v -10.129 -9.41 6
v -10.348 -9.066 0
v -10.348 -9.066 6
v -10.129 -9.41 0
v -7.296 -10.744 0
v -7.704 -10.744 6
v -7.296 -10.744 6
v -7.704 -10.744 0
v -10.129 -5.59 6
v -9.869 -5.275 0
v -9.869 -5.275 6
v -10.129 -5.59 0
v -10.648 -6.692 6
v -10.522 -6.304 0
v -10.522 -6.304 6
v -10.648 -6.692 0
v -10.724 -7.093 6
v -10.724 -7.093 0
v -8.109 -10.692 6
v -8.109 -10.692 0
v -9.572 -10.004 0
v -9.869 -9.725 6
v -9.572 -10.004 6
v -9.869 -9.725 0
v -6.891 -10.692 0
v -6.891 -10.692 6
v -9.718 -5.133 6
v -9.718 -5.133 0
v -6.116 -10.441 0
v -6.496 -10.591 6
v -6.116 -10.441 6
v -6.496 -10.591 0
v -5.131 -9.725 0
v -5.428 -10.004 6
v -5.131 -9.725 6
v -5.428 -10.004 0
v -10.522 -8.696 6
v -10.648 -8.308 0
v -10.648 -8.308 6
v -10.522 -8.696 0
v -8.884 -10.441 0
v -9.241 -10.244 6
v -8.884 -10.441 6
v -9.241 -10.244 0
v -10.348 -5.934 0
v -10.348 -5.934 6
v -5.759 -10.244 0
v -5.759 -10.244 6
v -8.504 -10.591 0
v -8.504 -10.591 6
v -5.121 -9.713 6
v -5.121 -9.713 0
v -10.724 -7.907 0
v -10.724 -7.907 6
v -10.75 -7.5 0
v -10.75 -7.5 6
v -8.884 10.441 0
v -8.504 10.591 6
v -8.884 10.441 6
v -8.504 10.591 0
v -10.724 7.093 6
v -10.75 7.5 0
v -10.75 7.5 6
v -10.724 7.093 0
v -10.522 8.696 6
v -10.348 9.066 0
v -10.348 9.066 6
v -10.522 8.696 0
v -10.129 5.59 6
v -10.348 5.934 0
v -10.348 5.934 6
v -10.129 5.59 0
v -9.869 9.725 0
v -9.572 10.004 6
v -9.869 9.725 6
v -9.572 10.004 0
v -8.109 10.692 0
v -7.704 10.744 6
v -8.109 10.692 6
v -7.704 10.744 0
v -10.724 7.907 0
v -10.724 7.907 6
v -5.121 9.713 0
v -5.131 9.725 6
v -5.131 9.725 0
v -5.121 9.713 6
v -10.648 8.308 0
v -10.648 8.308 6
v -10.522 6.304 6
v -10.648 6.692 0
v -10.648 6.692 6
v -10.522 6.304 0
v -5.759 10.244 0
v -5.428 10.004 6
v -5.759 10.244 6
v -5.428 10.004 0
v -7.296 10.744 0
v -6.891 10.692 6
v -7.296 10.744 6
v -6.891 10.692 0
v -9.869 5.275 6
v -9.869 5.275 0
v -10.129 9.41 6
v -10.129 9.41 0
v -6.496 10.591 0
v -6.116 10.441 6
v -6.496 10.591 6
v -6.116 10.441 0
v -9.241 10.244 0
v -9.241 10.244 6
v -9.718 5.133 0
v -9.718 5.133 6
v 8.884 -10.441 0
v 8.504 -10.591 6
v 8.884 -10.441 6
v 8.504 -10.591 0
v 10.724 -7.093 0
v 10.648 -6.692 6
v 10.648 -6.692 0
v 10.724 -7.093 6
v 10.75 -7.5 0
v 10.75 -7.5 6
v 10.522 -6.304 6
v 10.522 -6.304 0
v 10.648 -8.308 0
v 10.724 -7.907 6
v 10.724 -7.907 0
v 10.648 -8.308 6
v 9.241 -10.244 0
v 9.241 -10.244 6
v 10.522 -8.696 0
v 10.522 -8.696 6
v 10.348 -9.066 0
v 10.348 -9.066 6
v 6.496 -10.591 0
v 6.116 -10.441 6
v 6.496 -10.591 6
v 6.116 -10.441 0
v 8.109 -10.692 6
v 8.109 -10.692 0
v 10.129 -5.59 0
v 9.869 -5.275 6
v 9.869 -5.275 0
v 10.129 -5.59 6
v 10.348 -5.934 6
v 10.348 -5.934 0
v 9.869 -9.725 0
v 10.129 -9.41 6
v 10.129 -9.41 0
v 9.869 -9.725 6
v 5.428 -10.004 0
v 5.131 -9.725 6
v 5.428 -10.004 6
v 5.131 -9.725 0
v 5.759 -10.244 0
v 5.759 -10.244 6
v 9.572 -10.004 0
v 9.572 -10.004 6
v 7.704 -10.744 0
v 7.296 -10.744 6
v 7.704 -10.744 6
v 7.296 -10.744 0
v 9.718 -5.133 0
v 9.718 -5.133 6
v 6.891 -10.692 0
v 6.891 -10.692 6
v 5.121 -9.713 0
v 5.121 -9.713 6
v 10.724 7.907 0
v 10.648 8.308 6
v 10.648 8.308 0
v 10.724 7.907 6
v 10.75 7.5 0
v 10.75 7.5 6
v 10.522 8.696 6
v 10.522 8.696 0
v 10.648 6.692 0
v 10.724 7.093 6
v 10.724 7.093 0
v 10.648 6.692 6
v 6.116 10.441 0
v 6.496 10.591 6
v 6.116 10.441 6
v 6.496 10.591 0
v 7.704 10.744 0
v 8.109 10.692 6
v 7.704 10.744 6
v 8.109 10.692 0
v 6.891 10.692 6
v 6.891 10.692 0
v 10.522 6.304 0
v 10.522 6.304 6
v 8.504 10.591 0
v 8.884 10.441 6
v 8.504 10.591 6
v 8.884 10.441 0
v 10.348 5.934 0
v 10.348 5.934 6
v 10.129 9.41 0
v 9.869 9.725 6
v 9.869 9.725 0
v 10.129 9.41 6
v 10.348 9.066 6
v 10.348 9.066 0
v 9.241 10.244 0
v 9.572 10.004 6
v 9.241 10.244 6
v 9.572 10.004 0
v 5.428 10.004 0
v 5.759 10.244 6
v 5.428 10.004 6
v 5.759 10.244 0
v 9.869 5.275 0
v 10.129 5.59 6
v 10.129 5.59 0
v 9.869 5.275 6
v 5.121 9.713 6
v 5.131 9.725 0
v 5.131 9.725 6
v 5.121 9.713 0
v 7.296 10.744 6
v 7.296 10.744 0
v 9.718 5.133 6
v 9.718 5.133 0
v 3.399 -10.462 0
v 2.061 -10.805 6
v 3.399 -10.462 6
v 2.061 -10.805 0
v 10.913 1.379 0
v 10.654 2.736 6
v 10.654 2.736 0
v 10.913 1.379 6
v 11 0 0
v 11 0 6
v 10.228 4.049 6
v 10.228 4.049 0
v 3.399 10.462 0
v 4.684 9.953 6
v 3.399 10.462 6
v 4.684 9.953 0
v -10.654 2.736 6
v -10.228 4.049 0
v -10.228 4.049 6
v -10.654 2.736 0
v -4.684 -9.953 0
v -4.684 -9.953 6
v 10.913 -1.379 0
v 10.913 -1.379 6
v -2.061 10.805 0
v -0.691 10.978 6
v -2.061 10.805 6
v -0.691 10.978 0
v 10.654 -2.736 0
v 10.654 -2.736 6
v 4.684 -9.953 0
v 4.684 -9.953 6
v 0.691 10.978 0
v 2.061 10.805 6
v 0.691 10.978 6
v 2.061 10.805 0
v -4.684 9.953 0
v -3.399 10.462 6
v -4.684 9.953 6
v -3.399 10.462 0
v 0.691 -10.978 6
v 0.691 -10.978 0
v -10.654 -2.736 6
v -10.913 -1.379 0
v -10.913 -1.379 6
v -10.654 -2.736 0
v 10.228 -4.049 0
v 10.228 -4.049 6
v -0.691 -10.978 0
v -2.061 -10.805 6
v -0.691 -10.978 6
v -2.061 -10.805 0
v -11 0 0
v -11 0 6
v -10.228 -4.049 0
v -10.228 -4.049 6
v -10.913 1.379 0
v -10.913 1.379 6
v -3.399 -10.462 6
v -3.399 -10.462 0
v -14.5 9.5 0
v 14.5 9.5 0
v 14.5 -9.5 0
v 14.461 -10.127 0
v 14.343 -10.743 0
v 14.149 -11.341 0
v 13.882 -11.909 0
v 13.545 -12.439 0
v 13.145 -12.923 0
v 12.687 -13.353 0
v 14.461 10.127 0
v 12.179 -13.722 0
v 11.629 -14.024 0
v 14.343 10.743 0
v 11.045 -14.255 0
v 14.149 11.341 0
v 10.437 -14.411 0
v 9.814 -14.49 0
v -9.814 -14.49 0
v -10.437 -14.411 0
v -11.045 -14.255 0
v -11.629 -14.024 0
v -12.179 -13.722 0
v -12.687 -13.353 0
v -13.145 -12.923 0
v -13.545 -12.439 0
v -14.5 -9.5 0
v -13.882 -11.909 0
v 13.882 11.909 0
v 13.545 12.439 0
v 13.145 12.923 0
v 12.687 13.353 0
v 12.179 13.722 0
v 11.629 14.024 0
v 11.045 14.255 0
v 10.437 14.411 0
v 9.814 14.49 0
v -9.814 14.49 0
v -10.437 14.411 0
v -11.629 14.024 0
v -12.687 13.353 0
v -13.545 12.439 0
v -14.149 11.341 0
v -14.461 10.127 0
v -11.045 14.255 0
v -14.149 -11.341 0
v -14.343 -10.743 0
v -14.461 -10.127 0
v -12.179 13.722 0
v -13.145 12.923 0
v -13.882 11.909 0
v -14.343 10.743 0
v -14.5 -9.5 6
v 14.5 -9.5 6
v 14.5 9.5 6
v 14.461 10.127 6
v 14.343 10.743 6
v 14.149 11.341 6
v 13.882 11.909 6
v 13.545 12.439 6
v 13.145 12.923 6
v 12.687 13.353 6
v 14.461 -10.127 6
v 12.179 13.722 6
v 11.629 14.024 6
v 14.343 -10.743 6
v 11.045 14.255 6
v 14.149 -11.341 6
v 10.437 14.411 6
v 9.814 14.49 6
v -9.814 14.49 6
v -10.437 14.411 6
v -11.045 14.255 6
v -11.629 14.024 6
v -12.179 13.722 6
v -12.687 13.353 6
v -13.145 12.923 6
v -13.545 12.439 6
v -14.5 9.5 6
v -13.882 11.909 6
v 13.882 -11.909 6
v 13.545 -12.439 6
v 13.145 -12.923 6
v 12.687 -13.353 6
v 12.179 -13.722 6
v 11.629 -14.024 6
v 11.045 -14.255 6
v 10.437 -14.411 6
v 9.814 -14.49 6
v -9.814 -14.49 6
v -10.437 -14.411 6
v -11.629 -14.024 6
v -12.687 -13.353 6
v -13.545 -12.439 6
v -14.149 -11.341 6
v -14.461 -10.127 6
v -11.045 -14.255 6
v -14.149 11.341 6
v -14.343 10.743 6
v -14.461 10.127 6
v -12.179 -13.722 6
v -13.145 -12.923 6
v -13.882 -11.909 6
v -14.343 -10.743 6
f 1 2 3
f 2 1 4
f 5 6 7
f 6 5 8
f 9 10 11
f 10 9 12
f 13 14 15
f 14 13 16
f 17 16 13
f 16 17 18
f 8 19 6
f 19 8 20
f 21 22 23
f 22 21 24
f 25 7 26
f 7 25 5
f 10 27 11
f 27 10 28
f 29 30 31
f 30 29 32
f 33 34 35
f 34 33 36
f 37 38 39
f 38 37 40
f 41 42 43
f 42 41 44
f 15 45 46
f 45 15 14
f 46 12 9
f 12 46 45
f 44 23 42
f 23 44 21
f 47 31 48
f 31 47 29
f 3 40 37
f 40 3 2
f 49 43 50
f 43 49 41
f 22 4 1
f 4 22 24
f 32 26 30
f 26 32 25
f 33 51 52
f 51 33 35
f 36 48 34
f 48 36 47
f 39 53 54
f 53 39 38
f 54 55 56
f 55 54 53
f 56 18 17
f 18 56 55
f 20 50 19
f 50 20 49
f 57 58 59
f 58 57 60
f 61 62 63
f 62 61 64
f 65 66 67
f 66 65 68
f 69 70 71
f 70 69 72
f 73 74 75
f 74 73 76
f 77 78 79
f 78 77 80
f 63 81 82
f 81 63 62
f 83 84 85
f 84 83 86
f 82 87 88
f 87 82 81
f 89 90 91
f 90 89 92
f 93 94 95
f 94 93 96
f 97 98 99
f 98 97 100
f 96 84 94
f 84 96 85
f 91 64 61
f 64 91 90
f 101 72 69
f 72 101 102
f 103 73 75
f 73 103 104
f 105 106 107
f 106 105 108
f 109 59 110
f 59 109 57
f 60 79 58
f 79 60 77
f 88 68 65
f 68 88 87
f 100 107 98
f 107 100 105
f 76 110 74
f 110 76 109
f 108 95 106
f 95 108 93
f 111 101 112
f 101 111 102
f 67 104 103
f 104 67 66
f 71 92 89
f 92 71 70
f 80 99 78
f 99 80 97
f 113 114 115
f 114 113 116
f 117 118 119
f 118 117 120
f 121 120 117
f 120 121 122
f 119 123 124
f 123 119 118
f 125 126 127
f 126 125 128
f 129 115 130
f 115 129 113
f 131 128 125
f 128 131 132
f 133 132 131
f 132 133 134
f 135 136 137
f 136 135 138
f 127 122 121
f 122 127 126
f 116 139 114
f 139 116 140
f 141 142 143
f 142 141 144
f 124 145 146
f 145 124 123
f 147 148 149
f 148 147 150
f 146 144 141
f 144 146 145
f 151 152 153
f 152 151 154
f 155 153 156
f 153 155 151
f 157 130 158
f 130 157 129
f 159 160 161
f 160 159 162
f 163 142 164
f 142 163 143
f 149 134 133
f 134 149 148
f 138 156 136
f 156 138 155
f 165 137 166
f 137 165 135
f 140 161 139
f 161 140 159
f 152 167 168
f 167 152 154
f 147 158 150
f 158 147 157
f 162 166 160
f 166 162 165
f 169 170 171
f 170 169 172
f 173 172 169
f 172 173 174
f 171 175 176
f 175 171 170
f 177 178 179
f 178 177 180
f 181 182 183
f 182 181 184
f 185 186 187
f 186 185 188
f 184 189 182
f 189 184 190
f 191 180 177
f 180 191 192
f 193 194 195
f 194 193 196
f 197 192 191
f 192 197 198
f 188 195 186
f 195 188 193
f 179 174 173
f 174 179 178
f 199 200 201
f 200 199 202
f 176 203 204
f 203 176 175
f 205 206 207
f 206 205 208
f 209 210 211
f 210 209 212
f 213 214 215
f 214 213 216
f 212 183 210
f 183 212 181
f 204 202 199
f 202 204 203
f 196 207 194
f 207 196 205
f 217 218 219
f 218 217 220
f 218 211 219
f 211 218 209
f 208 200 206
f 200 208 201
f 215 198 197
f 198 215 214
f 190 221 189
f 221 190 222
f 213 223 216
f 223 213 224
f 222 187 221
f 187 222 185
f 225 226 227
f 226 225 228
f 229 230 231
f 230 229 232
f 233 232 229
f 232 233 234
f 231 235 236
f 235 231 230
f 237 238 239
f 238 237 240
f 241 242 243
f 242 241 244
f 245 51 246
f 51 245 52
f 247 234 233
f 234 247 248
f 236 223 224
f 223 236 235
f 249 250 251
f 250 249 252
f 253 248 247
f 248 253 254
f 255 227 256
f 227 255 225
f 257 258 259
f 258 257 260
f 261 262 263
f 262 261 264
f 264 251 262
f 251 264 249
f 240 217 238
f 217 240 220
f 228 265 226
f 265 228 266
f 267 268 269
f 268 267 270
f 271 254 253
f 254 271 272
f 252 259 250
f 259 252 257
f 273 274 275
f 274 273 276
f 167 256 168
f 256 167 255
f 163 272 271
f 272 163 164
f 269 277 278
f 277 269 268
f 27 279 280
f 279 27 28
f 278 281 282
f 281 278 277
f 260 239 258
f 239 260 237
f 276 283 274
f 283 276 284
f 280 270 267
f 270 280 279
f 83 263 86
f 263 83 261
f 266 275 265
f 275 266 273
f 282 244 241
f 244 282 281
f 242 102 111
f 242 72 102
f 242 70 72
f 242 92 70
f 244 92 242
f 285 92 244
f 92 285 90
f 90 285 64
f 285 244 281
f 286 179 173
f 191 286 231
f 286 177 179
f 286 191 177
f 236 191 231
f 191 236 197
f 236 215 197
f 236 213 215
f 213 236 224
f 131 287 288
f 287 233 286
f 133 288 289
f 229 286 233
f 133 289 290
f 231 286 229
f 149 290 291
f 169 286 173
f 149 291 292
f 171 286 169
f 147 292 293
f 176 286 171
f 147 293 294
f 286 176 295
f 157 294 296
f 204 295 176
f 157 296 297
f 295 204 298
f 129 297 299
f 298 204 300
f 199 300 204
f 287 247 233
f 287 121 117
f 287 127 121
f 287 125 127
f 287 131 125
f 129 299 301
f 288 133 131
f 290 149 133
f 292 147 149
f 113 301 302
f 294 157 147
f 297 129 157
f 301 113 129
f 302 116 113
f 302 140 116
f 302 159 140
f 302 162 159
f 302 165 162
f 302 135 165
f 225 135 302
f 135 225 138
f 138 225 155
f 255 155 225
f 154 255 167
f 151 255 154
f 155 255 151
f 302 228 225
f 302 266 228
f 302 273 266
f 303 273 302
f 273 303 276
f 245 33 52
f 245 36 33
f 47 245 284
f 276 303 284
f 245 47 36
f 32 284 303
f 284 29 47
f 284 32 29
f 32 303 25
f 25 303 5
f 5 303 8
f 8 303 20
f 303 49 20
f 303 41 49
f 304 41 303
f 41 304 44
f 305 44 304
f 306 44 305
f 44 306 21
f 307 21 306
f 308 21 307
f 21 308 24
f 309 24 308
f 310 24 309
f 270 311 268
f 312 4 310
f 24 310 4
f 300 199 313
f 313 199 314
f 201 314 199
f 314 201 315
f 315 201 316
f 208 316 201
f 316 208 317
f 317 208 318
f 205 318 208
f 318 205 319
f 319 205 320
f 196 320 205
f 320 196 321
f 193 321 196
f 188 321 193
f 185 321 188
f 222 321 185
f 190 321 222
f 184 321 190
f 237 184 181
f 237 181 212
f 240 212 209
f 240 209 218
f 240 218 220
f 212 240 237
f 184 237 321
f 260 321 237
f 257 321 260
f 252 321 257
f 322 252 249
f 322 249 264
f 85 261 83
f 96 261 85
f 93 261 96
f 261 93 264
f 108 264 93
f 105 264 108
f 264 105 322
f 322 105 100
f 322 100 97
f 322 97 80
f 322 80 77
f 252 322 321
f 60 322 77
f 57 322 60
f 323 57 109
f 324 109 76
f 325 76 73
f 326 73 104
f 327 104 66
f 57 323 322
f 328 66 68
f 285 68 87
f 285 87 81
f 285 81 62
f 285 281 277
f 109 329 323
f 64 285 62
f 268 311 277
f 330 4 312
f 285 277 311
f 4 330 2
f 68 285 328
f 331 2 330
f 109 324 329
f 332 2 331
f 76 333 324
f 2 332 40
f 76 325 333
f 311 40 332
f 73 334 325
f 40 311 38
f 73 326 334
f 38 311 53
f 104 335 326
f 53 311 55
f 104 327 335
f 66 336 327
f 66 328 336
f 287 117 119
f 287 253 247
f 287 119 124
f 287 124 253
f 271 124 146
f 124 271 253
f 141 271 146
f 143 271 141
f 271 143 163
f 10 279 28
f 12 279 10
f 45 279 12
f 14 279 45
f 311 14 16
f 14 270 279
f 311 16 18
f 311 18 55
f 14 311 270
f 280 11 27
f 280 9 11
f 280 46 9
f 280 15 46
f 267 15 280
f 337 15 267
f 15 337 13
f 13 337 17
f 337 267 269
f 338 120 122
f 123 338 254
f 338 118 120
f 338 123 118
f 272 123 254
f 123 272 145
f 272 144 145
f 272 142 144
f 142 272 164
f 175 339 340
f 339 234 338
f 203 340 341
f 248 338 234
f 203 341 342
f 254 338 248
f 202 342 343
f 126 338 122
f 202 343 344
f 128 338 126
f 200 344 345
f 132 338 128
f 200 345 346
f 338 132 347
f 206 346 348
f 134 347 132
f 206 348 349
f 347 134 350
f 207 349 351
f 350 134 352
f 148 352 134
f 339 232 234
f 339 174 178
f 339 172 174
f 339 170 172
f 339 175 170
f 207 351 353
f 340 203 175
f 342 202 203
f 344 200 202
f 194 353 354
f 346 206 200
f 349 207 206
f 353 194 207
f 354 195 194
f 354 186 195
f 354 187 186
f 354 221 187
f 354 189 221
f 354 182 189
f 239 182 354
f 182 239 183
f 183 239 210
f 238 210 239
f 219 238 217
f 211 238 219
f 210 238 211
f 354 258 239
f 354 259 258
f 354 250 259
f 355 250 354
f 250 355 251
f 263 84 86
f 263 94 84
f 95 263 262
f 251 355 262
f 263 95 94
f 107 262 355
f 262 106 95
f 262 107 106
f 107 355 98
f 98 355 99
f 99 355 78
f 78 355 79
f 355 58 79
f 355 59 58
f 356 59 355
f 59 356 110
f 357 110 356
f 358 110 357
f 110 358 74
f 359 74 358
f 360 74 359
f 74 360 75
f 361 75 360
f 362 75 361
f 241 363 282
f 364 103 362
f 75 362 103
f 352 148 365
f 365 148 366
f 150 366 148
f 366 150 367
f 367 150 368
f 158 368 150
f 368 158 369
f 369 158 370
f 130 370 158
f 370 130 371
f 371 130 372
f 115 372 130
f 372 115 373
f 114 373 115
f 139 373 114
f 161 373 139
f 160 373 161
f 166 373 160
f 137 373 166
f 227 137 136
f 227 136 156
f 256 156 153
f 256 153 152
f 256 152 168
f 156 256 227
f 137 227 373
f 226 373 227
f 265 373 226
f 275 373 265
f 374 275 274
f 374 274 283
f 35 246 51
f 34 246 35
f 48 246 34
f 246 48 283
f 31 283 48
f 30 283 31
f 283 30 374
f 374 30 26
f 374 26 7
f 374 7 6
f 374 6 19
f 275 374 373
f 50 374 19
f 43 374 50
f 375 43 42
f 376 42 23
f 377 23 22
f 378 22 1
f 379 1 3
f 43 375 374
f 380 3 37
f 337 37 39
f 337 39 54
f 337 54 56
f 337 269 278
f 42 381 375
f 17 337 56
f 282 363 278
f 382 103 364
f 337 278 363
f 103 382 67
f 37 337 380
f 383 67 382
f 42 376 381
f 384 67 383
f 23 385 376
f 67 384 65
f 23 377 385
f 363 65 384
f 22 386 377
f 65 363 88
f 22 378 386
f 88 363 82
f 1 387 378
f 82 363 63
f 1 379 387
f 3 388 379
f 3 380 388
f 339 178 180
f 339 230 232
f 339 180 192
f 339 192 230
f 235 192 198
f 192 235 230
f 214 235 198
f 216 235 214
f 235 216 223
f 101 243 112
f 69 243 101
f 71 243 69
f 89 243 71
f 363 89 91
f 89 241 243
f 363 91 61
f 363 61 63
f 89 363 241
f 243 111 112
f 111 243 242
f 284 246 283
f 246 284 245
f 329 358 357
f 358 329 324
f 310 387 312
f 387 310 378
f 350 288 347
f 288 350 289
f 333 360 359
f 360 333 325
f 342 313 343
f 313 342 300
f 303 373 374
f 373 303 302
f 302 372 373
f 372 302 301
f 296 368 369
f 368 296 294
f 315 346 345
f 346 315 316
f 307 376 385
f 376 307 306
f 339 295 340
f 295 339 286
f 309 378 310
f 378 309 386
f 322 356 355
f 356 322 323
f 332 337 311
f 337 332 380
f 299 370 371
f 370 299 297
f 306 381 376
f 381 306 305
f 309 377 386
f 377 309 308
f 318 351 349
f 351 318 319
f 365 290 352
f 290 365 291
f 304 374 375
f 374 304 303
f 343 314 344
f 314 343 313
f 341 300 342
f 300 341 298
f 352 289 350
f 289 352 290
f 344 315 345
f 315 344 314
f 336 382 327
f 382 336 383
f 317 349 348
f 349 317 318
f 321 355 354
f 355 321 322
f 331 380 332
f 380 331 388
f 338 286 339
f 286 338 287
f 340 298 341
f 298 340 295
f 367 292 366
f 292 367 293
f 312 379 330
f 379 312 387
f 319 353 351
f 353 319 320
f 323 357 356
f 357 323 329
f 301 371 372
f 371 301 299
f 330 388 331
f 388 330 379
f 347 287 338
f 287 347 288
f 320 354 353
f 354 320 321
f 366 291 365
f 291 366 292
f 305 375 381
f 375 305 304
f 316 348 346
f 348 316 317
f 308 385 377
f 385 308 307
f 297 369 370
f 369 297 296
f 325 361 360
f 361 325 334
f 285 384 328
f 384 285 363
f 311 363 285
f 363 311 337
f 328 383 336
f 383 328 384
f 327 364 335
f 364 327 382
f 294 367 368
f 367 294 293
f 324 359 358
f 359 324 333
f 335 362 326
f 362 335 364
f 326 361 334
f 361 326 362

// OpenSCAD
$fn = 50;


difference() {
	union() {
		hull() {
			translate(v = [-9.5000000000, 9.5000000000, 0]) {
				cylinder(h = 6, r = 5);
			}
			translate(v = [9.5000000000, 9.5000000000, 0]) {
				cylinder(h = 6, r = 5);
			}
			translate(v = [-9.5000000000, -9.5000000000, 0]) {
				cylinder(h = 6, r = 5);
			}
			translate(v = [9.5000000000, -9.5000000000, 0]) {
				cylinder(h = 6, r = 5);
			}
		}
	}
	union() {
		#translate(v = [-7.5000000000, -7.5000000000, -100.0000000000]) {
			cylinder(h = 200, r = 3.2500000000);
		}
		#translate(v = [-7.5000000000, 7.5000000000, -100.0000000000]) {
			cylinder(h = 200, r = 3.2500000000);
		}
		#translate(v = [7.5000000000, -7.5000000000, -100.0000000000]) {
			cylinder(h = 200, r = 3.2500000000);
		}
		#translate(v = [7.5000000000, 7.5000000000, -100.0000000000]) {
			cylinder(h = 200, r = 3.2500000000);
		}
		#cylinder(h = 6, r = 11.0000000000);
	}
}
